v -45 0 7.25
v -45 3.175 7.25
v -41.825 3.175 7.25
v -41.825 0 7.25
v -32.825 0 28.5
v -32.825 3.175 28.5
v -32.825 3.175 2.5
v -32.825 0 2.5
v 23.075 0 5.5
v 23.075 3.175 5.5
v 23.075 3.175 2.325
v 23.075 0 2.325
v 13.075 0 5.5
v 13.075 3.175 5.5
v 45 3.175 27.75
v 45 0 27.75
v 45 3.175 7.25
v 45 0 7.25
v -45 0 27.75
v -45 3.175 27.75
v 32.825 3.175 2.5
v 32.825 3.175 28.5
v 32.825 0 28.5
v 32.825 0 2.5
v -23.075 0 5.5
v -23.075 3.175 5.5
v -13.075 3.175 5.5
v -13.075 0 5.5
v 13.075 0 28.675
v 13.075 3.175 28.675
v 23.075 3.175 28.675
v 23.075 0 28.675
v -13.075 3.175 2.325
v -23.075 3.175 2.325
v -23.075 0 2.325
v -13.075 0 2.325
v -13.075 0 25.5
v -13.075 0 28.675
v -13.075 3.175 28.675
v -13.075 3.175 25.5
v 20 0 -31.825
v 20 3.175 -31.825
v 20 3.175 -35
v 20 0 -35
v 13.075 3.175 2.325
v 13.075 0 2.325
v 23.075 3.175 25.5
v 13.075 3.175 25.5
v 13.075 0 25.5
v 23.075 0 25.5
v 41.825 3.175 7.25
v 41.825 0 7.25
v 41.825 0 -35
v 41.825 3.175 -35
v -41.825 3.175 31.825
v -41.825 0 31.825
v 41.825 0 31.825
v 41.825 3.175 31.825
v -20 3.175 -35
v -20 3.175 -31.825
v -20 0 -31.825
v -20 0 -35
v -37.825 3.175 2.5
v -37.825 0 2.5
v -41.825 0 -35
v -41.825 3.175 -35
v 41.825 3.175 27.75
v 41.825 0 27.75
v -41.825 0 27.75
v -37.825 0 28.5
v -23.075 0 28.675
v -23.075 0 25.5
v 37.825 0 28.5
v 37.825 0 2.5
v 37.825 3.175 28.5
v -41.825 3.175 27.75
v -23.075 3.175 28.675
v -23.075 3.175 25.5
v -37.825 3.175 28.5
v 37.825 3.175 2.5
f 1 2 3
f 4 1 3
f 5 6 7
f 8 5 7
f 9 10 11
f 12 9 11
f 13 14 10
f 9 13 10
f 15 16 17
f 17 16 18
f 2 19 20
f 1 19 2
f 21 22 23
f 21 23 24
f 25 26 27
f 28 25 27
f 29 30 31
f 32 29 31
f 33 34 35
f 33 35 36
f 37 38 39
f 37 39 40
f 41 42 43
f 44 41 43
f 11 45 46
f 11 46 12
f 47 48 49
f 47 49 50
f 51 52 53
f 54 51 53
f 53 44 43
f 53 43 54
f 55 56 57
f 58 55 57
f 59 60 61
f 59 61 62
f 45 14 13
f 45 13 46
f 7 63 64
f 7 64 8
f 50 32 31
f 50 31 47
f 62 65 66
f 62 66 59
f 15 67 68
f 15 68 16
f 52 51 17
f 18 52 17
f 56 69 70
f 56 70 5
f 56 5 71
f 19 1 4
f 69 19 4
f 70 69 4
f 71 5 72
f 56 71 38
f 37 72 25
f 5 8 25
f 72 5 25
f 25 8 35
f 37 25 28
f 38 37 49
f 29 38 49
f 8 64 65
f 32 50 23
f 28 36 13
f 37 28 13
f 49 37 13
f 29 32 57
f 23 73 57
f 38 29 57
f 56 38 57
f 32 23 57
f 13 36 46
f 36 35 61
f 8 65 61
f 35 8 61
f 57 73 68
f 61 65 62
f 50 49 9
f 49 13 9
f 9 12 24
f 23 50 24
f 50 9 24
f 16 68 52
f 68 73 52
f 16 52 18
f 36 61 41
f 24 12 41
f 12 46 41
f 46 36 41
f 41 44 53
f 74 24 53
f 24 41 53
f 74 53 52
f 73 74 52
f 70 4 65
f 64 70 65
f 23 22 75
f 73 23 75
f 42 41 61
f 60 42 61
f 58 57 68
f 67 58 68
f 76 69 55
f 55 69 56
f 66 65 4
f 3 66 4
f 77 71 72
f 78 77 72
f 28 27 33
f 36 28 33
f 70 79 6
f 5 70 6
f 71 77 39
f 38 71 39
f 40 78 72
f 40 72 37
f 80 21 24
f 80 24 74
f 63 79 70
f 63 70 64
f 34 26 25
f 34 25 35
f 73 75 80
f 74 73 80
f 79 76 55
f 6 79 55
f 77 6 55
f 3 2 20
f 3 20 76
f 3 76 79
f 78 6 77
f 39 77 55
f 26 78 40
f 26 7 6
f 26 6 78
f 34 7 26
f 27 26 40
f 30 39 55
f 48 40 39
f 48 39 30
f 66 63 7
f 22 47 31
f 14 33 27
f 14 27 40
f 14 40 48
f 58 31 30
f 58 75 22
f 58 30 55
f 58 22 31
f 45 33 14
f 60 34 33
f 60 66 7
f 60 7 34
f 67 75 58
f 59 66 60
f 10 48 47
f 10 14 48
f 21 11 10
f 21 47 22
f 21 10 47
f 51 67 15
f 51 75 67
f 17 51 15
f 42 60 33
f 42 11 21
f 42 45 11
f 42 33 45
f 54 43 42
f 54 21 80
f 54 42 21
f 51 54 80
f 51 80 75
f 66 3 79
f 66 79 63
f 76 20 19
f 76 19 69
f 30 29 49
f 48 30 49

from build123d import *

# Parameters (mm, degrees)
SKETCH1_W           = 21.825
SKETCH1_H           = 3.175
SKETCH1_W_2         = 3.175
SKETCH1_H_2         = 20.5
BOSS_EXTRUDE1_DEPTH = 3.175
SKETCH2_W           = 5
SKETCH2_H           = 26
SKETCH2_W_2         = 10
SKETCH2_H_2         = 3.175
CUT_EXTRUDE1_DEPTH  = 23.175


with BuildPart() as part:
    # Sketch1 → Boss-Extrude1 (new body)
    with BuildSketch(Plane(origin=(0, 0, 0), x_dir=(1, 0, 0), z_dir=(0, 1, 0))):
        Polygon((-20, 31.825), (-41.825, 31.825), (-41.825, -7.25), (-41.825, -27.75), (-41.825, -31.825), (-20, -31.825), (20, -31.825), (41.825, -31.825), (41.825, -27.75), (41.825, -7.25), (41.825, 31.825), (20, 31.825), align=None)
        with Locations((30.9125, 33.4125)):
            Rectangle(SKETCH1_W, SKETCH1_H)
        with Locations((-30.9125, 33.4125)):
            Rectangle(SKETCH1_W, SKETCH1_H)
        with Locations((-43.4125, -17.5)):
            Rectangle(SKETCH1_W_2, SKETCH1_H_2)
        with Locations((43.4125, -17.5)):
            Rectangle(SKETCH1_W_2, SKETCH1_H_2)
    extrude(amount=BOSS_EXTRUDE1_DEPTH)

    # Sketch2 → Cut-Extrude1 (cut)
    with BuildSketch(Plane(origin=(0, 3.175, 0), x_dir=(1, 0, 0), z_dir=(0, 1, 0))):
        with Locations((-35.325, -15.5)):
            Rectangle(SKETCH2_W, SKETCH2_H)
        with Locations((35.325, -15.5)):
            Rectangle(SKETCH2_W, SKETCH2_H)
        with Locations((-18.075, -3.9125)):
            Rectangle(SKETCH2_W_2, SKETCH2_H_2)
        with Locations((18.075, -3.9125)):
            Rectangle(SKETCH2_W_2, SKETCH2_H_2)
        with Locations((18.075, -27.0875)):
            Rectangle(SKETCH2_W_2, SKETCH2_H_2)
        with Locations((-18.075, -27.0875)):
            Rectangle(SKETCH2_W_2, SKETCH2_H_2)
    extrude(amount=-CUT_EXTRUDE1_DEPTH, mode=Mode.SUBTRACT)


solid = part.part
